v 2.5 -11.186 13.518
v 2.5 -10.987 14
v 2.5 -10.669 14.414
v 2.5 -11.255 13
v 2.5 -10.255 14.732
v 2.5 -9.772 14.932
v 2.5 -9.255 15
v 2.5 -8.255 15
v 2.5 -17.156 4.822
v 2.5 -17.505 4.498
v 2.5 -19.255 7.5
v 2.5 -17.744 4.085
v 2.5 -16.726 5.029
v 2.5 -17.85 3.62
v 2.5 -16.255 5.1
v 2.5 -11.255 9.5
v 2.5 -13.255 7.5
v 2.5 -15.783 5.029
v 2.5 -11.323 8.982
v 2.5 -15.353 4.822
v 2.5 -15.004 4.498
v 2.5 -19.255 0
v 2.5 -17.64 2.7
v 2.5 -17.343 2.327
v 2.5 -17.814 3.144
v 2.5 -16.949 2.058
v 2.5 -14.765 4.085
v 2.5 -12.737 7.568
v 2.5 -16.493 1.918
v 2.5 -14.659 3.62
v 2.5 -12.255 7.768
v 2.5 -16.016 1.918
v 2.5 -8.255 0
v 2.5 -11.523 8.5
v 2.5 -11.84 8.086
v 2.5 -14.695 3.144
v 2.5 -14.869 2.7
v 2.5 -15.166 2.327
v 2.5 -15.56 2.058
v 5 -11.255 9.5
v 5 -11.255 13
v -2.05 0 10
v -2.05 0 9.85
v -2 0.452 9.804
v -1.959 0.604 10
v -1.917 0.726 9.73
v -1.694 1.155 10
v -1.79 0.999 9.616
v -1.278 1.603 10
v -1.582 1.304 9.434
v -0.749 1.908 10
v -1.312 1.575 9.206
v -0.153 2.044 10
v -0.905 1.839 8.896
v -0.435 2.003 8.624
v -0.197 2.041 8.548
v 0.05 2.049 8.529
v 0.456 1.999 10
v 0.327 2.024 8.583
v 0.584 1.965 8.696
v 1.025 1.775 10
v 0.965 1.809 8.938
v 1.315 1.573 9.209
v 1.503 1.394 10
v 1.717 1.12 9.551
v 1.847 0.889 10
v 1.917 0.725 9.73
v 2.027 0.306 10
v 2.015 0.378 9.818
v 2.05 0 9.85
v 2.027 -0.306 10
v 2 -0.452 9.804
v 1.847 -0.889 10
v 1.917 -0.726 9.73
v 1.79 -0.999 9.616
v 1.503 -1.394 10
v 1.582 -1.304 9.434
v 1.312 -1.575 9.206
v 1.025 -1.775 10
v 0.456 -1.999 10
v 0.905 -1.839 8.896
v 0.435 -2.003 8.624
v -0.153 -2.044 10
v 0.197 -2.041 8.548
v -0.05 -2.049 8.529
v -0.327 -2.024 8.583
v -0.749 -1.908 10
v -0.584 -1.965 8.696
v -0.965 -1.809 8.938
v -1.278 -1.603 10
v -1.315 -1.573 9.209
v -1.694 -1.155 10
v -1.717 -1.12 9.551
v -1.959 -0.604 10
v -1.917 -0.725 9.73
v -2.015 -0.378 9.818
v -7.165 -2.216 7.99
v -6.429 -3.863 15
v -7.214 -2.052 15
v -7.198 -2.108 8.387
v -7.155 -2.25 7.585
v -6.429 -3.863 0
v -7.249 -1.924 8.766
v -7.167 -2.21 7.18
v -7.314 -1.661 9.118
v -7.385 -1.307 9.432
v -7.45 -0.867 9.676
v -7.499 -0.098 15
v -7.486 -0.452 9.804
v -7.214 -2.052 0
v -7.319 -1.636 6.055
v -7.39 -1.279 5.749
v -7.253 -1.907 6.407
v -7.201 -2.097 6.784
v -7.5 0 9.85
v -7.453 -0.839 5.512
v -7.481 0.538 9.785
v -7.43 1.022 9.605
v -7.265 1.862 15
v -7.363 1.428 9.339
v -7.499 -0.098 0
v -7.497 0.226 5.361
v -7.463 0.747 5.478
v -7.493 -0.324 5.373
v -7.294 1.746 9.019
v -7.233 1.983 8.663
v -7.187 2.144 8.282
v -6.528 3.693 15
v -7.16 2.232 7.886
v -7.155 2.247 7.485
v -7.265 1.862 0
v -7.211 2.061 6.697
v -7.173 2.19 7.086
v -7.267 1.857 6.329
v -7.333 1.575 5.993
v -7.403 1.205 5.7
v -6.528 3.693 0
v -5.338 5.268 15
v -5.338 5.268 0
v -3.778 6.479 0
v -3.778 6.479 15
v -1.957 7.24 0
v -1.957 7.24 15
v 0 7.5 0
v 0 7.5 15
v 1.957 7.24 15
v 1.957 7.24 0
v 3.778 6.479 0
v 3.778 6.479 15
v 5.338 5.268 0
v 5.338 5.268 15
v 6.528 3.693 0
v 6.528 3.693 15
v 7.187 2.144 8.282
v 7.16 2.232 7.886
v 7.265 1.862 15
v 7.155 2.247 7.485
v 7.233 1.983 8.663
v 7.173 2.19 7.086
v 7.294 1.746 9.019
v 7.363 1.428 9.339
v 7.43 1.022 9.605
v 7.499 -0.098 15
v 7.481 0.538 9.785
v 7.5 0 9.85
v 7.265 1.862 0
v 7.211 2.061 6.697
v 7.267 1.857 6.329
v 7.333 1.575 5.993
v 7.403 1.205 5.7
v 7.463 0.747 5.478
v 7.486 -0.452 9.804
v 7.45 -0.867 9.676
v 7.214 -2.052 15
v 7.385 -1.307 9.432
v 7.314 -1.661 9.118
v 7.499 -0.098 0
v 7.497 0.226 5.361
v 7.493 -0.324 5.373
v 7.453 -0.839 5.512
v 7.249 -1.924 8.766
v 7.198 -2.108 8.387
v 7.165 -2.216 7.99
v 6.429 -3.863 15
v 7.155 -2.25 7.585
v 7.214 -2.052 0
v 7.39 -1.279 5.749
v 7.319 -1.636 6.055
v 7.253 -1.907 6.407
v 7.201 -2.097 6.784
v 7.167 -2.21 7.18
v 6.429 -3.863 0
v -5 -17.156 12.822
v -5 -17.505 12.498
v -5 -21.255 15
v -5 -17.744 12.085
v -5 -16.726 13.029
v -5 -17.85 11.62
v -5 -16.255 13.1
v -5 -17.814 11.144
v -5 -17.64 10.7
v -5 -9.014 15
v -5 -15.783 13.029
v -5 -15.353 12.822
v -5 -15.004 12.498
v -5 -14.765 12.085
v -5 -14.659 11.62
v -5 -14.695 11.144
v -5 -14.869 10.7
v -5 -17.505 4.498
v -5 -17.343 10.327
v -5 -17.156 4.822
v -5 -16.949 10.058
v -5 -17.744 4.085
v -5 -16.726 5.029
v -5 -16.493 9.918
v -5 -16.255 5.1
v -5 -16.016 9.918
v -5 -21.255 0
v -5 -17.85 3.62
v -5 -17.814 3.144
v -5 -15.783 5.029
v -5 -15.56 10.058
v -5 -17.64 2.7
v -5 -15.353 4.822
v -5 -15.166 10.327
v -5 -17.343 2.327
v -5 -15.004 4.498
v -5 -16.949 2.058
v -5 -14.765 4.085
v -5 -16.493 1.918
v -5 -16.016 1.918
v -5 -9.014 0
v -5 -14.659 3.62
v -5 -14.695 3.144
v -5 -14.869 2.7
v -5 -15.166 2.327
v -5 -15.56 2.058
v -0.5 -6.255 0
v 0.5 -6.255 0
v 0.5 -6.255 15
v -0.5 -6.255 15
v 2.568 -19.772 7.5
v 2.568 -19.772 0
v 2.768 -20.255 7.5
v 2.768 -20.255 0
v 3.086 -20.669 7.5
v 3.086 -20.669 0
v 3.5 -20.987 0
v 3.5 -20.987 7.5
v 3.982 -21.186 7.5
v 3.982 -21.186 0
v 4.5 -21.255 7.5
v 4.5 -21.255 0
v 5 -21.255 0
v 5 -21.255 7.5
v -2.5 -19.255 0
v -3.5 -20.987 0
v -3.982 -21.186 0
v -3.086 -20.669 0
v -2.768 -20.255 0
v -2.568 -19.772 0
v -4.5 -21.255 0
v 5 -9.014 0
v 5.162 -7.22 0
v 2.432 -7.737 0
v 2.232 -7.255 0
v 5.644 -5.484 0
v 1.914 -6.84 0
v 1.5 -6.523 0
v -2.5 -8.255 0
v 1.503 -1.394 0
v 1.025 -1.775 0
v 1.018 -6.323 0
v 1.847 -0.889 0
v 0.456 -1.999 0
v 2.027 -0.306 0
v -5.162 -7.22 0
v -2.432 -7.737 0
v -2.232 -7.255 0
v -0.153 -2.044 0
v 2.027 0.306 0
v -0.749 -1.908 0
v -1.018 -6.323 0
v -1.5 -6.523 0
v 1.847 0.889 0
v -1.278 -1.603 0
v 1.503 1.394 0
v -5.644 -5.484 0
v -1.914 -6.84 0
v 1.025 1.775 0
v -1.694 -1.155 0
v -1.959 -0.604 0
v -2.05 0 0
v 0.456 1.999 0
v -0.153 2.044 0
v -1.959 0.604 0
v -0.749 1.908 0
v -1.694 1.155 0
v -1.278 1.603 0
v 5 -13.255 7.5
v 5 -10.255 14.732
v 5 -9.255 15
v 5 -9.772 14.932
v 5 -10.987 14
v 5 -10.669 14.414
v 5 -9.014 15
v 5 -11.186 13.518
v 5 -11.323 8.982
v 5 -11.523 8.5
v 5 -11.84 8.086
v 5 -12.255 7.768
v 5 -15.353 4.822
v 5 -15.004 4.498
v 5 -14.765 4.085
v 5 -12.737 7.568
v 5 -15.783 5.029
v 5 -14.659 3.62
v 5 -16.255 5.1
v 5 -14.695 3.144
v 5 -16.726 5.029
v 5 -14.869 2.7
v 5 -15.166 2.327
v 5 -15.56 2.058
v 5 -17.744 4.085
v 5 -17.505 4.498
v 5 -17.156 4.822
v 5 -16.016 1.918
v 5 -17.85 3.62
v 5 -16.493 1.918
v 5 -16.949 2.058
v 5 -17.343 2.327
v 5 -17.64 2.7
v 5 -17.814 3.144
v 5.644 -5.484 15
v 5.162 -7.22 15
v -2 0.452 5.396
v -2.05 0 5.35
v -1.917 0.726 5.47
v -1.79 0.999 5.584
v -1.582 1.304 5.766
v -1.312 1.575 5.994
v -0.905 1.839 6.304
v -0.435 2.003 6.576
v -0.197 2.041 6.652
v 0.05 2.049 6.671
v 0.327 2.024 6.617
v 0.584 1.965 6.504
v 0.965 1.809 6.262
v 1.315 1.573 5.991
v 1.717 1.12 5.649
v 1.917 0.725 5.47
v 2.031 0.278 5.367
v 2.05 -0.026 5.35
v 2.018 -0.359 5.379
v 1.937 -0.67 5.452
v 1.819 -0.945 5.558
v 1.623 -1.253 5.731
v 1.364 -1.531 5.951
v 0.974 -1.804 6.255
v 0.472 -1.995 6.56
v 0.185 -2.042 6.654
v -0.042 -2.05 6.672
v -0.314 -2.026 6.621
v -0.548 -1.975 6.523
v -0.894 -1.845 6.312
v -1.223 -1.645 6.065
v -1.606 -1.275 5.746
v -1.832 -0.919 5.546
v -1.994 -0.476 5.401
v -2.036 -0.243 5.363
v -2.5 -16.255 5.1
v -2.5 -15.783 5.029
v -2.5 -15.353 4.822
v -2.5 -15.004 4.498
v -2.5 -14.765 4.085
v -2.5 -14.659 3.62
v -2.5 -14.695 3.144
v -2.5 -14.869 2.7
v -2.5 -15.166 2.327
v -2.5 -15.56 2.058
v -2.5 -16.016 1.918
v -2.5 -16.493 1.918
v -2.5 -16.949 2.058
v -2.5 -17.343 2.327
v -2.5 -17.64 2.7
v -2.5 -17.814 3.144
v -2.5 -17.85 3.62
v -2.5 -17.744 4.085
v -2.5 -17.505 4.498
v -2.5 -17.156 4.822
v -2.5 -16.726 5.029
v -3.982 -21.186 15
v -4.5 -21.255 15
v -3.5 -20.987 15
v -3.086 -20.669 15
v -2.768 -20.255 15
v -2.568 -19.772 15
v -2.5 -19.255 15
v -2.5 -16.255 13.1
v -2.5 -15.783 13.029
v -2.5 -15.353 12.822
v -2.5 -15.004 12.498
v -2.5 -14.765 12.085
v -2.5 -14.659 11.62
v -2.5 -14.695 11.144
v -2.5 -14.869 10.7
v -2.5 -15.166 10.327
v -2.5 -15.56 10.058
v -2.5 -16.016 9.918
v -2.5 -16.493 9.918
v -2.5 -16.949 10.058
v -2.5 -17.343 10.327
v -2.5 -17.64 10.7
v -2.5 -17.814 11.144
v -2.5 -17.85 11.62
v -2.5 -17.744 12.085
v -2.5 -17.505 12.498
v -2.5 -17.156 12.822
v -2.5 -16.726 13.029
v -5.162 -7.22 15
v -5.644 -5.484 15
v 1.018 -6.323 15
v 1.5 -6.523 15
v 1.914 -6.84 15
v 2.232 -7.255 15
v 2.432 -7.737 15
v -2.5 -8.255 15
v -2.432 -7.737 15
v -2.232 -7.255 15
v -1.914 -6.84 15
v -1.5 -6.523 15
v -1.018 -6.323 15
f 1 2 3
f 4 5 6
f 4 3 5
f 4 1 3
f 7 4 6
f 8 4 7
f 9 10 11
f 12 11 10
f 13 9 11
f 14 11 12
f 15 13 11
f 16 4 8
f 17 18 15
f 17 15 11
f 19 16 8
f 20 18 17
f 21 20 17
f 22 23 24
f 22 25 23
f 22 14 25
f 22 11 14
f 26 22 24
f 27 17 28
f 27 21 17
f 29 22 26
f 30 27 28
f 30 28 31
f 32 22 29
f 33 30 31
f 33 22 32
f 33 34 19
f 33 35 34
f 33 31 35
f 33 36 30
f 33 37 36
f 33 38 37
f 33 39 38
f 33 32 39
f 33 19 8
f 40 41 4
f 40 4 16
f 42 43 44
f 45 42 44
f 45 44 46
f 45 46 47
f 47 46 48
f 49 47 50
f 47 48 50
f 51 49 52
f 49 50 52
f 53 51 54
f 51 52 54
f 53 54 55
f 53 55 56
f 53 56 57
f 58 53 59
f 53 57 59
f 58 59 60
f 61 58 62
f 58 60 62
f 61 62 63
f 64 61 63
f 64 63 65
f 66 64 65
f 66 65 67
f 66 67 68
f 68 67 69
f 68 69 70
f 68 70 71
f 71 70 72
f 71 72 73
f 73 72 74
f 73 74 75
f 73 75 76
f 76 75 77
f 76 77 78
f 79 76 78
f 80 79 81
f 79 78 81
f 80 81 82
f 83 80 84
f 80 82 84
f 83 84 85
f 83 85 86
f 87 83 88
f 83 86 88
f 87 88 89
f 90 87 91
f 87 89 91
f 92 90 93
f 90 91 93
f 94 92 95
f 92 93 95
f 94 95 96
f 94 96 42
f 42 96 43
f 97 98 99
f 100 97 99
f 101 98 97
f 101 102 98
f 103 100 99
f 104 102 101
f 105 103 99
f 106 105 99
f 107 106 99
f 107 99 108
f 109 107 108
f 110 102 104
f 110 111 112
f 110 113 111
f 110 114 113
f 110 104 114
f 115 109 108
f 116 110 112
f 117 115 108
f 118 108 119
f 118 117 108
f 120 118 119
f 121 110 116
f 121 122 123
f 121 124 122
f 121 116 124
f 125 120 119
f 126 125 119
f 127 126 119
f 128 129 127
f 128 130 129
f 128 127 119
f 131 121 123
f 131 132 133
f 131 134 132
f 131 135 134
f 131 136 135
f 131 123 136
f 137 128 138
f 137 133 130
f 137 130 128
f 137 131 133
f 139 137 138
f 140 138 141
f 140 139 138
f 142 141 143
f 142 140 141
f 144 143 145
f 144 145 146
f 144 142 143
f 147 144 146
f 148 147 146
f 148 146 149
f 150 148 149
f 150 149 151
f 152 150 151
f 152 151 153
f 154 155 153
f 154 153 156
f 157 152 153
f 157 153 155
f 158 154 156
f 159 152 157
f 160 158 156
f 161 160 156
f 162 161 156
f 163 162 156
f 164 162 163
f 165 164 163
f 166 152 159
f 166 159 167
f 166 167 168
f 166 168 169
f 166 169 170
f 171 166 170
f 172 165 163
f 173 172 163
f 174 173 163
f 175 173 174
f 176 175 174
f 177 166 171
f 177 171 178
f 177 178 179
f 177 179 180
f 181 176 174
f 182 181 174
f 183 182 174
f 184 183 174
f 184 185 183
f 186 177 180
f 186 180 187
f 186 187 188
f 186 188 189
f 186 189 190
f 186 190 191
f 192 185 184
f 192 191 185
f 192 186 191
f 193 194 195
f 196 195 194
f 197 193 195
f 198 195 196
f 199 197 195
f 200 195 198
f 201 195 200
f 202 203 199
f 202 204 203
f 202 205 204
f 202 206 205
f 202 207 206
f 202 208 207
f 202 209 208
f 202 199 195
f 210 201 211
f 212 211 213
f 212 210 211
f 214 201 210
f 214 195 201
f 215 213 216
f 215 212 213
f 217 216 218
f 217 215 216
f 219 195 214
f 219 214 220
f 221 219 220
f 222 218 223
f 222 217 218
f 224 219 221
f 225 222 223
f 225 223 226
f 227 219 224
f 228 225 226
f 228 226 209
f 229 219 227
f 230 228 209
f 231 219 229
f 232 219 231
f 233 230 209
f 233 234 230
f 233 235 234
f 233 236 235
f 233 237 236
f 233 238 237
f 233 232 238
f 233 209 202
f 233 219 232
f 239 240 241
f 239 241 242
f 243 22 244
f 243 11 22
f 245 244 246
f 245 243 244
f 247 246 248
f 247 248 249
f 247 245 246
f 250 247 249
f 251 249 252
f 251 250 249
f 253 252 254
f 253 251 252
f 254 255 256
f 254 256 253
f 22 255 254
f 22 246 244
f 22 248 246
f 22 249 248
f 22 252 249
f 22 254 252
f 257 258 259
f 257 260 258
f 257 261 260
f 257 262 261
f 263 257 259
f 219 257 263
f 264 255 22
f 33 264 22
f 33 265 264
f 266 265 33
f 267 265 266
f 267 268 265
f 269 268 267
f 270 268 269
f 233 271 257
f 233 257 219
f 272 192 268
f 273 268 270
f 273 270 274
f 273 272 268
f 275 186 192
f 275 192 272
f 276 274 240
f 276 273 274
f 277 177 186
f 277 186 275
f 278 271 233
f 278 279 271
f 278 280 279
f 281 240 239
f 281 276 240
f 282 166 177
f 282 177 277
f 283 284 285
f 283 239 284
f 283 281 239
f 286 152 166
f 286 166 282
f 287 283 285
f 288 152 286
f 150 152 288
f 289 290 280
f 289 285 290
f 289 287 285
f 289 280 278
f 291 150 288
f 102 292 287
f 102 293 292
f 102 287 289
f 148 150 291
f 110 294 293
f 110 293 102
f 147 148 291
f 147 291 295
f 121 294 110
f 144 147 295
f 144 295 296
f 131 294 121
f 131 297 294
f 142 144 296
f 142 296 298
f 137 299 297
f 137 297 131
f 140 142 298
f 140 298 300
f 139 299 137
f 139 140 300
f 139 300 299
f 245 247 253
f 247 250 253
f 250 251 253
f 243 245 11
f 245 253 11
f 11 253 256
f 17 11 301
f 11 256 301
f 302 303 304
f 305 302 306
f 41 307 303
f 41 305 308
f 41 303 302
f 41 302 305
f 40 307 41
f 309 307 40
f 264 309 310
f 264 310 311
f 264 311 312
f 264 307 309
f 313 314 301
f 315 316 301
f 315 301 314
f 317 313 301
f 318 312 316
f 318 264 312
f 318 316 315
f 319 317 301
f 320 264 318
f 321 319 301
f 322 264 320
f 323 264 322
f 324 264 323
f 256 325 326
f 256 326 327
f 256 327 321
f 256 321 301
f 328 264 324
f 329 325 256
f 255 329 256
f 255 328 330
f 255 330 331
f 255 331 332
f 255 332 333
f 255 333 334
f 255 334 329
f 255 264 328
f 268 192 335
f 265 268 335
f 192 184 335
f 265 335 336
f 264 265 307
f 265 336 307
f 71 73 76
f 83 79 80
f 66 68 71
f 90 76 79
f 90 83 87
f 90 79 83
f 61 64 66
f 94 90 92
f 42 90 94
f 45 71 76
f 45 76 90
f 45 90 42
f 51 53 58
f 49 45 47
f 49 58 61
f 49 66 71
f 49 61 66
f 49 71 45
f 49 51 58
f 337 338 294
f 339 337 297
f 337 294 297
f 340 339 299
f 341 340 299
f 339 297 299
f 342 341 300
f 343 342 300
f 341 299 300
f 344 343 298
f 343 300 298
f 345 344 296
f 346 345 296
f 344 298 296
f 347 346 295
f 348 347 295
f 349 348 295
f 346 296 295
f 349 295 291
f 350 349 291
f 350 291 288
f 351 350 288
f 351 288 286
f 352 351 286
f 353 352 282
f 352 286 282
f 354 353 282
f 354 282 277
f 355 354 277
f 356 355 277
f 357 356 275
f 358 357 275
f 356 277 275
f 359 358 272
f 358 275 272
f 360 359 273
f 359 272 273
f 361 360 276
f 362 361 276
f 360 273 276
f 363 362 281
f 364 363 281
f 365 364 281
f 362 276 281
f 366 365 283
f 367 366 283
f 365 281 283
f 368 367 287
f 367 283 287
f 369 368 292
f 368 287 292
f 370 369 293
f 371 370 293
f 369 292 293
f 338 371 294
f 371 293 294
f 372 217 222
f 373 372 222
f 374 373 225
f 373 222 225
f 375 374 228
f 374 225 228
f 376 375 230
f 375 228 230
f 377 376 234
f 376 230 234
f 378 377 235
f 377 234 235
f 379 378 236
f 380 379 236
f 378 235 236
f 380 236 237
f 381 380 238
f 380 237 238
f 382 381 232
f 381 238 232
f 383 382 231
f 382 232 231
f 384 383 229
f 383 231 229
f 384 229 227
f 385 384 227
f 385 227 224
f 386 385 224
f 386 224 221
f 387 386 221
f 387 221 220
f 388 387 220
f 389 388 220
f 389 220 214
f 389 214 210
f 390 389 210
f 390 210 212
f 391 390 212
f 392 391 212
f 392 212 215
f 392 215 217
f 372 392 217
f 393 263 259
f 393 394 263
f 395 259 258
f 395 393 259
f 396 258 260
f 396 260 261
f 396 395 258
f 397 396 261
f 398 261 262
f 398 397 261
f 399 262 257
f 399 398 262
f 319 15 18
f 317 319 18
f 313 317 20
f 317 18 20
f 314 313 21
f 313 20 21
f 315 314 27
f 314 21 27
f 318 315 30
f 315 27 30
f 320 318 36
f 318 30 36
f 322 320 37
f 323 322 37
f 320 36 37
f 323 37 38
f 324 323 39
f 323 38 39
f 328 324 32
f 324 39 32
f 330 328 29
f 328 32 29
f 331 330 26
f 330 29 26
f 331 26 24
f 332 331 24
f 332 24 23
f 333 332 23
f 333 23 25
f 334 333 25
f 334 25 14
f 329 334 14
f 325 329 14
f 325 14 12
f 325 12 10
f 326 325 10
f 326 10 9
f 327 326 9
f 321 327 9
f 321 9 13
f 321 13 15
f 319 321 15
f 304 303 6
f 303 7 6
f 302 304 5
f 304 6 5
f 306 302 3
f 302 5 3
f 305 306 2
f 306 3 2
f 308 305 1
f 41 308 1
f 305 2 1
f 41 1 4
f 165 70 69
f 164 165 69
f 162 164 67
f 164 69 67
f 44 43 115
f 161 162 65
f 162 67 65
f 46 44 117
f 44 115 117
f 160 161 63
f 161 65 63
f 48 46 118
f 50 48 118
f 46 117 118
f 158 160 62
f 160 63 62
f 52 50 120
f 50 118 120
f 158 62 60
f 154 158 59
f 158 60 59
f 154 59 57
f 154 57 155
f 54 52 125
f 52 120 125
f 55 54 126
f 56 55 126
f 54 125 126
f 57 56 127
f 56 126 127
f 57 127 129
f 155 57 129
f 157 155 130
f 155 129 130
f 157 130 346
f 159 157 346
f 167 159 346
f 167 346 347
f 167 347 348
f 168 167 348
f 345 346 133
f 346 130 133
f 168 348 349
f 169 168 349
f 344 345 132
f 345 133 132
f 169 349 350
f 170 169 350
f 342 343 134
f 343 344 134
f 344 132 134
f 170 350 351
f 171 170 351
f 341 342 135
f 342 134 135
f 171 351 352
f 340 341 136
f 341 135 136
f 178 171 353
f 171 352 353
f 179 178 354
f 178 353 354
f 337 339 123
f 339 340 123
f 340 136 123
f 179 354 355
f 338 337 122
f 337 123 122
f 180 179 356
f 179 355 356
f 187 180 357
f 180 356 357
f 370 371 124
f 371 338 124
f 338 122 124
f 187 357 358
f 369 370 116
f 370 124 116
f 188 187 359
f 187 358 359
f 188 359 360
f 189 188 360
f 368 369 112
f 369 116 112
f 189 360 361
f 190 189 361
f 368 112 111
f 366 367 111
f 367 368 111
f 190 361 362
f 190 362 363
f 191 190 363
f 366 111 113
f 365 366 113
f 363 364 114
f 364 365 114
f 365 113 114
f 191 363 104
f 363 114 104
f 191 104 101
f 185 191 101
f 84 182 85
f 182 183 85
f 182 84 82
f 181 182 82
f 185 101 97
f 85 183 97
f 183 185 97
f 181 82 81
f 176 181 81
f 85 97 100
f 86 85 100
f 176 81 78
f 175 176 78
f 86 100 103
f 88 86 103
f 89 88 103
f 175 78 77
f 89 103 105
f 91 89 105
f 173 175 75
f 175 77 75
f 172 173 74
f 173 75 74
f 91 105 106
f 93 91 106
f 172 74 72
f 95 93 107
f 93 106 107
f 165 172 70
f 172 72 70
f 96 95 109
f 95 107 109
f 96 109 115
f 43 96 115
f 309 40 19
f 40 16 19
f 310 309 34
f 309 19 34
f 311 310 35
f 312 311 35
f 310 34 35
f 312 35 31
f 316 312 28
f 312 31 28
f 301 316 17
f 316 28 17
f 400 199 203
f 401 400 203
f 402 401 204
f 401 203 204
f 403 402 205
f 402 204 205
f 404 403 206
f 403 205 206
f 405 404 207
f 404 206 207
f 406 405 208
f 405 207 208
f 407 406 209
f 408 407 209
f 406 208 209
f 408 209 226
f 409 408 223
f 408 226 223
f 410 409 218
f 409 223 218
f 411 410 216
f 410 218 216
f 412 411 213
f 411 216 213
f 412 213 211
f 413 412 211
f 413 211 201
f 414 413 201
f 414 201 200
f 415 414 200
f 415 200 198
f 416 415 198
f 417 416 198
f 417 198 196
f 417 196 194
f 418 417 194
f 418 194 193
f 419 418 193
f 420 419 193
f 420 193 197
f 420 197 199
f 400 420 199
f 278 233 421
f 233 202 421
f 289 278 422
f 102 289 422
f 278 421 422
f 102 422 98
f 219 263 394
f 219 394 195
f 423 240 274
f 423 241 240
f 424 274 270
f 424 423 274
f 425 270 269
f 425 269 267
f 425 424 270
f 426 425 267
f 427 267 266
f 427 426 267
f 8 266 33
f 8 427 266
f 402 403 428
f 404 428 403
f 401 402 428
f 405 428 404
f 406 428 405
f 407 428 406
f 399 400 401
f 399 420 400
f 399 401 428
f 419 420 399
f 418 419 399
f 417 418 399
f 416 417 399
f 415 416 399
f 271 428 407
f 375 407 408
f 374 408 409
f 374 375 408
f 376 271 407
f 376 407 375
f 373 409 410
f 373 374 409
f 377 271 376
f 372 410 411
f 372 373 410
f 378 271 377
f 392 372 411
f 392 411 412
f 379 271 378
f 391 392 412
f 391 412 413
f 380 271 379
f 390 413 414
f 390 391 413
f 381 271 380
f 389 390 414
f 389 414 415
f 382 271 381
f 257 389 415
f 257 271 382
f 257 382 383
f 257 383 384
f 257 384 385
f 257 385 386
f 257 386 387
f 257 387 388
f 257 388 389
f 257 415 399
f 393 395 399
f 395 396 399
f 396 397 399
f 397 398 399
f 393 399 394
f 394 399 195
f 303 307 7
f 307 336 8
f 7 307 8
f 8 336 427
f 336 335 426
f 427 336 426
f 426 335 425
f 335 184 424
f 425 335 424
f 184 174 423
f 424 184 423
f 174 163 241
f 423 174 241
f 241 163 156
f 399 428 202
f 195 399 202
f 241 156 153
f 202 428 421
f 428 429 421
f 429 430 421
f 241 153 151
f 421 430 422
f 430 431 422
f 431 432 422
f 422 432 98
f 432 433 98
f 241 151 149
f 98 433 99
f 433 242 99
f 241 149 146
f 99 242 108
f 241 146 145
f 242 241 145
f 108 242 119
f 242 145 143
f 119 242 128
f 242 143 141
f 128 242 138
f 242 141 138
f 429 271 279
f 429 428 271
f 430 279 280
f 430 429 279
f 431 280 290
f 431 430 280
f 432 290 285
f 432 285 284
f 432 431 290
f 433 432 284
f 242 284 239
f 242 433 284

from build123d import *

# Parameters (mm, degrees)
BOSS_EXTRUDE1_DEPTH = 15
FILLET1_R           = 10
CUT_EXTRUDE4_REACH  = 30.862
SKETCH7_W           = 7.5
SKETCH7_H           = 10
CUT_EXTRUDE7_REACH  = 30.862
SKETCH10_R          = 1.6
SKETCH9_R           = 1.6
CUT_EXTRUDE8_DEPTH  = 29.861852882
FILLET3_R           = 2
SKETCH3_R           = 2.05
CUT_EXTRUDE9_DEPTH  = 10
SKETCH11_R          = 2.25
CUT_EXTRUDE10_DEPTH = 15


with BuildPart() as part:
    # Sketch2 → Boss-Extrude1 (new body)
    with BuildSketch(Plane.XY):
        with BuildLine():
            Line((-2.5, -6.254565433), (-2.5, -21.254565433))
            Line((-2.5, -21.254565433), (-5, -21.254565433))
            Line((-5, -21.254565433), (-5, -6.254565433))
            Line((-5, -6.254565433), (-5, -5.590169944))
            ThreePointArc((-5, -5.590169944), (0, 7.5), (5, -5.590169944))
            Line((5, -5.590169944), (5, -6.254565433))
            Line((5, -6.254565433), (5, -21.254565433))
            Line((5, -21.254565433), (2.5, -21.254565433))
            Line((2.5, -21.254565433), (2.5, -6.254565433))
            Line((2.5, -6.254565433), (-2.5, -6.254565433))
        make_face()
    extrude(amount=BOSS_EXTRUDE1_DEPTH)

    # Fillet1
    fillet1_edges = [part.edges().sort_by_distance(p)[0] for p in [
        (-5, -5.590169944, 7.5),
        (5, -5.590169944, 7.5),
    ]]
    fillet(fillet1_edges, radius=FILLET1_R)

    # Sketch7 → Cut-Extrude4 (cut, up to next)
    with BuildSketch(Plane(origin=(5, 0, 0), x_dir=(0, 0, -1), z_dir=(1, 0, 0)), mode=Mode.PRIVATE) as cut_extrude4_sk1:
        with Locations((-11.25, -16.254565433)):
            Rectangle(SKETCH7_W, SKETCH7_H)
    cut_extrude4_tool1 = extrude(cut_extrude4_sk1.sketch, amount=-CUT_EXTRUDE4_REACH, mode=Mode.PRIVATE) & part.part
    add(cut_extrude4_tool1.solids().sort_by_distance((5, -16.254565, 11.25))[0], mode=Mode.SUBTRACT)

    # Sketch10 → Cut-Extrude7 (cut, up to next)
    with BuildSketch(Plane.ZY.offset(5), mode=Mode.PRIVATE) as cut_extrude7_sk1:
        with Locations((11.5, -16.254565433)):
            Circle(SKETCH10_R)
    cut_extrude7_tool1 = extrude(cut_extrude7_sk1.sketch, amount=-CUT_EXTRUDE7_REACH, mode=Mode.PRIVATE) & part.part
    add(cut_extrude7_tool1.solids().sort_by_distance((-5, -16.254565, 11.5))[0], mode=Mode.SUBTRACT)

    # Sketch9 → Cut-Extrude8 (cut, through all)
    with BuildSketch(Plane.ZY.offset(5)):
        with Locations((3.5, -16.254565433)):
            Circle(SKETCH9_R)
    extrude(amount=-CUT_EXTRUDE8_DEPTH, mode=Mode.SUBTRACT)

    # Fillet3
    fillet3_edges = [part.edges().sort_by_distance(p)[0] for p in [
        (-2.5, -6.254565433, 7.5),
        (-2.5, -21.254565433, 7.5),
        (2.5, -6.254565433, 7.5),
        (2.5, -21.254565433, 3.75),
        (3.75, -11.254565433, 15),
        (3.75, -11.254565433, 7.5),
    ]]
    fillet(fillet3_edges, radius=FILLET3_R)

    # Sketch3 → Cut-Extrude9 (cut)
    with BuildSketch(Plane(origin=(0, 0, 0), x_dir=(-1, 0, 0), z_dir=(0, 0, -1))):
        Circle(SKETCH3_R)
    extrude(amount=-CUT_EXTRUDE9_DEPTH, mode=Mode.SUBTRACT)

    # Sketch11 → Cut-Extrude10 (cut, symmetric)
    with BuildSketch(Plane.ZY.offset(5)):
        with Locations((7.6, 0)):
            Circle(SKETCH11_R)
    extrude(amount=CUT_EXTRUDE10_DEPTH, both=True, mode=Mode.SUBTRACT)


solid = part.part
